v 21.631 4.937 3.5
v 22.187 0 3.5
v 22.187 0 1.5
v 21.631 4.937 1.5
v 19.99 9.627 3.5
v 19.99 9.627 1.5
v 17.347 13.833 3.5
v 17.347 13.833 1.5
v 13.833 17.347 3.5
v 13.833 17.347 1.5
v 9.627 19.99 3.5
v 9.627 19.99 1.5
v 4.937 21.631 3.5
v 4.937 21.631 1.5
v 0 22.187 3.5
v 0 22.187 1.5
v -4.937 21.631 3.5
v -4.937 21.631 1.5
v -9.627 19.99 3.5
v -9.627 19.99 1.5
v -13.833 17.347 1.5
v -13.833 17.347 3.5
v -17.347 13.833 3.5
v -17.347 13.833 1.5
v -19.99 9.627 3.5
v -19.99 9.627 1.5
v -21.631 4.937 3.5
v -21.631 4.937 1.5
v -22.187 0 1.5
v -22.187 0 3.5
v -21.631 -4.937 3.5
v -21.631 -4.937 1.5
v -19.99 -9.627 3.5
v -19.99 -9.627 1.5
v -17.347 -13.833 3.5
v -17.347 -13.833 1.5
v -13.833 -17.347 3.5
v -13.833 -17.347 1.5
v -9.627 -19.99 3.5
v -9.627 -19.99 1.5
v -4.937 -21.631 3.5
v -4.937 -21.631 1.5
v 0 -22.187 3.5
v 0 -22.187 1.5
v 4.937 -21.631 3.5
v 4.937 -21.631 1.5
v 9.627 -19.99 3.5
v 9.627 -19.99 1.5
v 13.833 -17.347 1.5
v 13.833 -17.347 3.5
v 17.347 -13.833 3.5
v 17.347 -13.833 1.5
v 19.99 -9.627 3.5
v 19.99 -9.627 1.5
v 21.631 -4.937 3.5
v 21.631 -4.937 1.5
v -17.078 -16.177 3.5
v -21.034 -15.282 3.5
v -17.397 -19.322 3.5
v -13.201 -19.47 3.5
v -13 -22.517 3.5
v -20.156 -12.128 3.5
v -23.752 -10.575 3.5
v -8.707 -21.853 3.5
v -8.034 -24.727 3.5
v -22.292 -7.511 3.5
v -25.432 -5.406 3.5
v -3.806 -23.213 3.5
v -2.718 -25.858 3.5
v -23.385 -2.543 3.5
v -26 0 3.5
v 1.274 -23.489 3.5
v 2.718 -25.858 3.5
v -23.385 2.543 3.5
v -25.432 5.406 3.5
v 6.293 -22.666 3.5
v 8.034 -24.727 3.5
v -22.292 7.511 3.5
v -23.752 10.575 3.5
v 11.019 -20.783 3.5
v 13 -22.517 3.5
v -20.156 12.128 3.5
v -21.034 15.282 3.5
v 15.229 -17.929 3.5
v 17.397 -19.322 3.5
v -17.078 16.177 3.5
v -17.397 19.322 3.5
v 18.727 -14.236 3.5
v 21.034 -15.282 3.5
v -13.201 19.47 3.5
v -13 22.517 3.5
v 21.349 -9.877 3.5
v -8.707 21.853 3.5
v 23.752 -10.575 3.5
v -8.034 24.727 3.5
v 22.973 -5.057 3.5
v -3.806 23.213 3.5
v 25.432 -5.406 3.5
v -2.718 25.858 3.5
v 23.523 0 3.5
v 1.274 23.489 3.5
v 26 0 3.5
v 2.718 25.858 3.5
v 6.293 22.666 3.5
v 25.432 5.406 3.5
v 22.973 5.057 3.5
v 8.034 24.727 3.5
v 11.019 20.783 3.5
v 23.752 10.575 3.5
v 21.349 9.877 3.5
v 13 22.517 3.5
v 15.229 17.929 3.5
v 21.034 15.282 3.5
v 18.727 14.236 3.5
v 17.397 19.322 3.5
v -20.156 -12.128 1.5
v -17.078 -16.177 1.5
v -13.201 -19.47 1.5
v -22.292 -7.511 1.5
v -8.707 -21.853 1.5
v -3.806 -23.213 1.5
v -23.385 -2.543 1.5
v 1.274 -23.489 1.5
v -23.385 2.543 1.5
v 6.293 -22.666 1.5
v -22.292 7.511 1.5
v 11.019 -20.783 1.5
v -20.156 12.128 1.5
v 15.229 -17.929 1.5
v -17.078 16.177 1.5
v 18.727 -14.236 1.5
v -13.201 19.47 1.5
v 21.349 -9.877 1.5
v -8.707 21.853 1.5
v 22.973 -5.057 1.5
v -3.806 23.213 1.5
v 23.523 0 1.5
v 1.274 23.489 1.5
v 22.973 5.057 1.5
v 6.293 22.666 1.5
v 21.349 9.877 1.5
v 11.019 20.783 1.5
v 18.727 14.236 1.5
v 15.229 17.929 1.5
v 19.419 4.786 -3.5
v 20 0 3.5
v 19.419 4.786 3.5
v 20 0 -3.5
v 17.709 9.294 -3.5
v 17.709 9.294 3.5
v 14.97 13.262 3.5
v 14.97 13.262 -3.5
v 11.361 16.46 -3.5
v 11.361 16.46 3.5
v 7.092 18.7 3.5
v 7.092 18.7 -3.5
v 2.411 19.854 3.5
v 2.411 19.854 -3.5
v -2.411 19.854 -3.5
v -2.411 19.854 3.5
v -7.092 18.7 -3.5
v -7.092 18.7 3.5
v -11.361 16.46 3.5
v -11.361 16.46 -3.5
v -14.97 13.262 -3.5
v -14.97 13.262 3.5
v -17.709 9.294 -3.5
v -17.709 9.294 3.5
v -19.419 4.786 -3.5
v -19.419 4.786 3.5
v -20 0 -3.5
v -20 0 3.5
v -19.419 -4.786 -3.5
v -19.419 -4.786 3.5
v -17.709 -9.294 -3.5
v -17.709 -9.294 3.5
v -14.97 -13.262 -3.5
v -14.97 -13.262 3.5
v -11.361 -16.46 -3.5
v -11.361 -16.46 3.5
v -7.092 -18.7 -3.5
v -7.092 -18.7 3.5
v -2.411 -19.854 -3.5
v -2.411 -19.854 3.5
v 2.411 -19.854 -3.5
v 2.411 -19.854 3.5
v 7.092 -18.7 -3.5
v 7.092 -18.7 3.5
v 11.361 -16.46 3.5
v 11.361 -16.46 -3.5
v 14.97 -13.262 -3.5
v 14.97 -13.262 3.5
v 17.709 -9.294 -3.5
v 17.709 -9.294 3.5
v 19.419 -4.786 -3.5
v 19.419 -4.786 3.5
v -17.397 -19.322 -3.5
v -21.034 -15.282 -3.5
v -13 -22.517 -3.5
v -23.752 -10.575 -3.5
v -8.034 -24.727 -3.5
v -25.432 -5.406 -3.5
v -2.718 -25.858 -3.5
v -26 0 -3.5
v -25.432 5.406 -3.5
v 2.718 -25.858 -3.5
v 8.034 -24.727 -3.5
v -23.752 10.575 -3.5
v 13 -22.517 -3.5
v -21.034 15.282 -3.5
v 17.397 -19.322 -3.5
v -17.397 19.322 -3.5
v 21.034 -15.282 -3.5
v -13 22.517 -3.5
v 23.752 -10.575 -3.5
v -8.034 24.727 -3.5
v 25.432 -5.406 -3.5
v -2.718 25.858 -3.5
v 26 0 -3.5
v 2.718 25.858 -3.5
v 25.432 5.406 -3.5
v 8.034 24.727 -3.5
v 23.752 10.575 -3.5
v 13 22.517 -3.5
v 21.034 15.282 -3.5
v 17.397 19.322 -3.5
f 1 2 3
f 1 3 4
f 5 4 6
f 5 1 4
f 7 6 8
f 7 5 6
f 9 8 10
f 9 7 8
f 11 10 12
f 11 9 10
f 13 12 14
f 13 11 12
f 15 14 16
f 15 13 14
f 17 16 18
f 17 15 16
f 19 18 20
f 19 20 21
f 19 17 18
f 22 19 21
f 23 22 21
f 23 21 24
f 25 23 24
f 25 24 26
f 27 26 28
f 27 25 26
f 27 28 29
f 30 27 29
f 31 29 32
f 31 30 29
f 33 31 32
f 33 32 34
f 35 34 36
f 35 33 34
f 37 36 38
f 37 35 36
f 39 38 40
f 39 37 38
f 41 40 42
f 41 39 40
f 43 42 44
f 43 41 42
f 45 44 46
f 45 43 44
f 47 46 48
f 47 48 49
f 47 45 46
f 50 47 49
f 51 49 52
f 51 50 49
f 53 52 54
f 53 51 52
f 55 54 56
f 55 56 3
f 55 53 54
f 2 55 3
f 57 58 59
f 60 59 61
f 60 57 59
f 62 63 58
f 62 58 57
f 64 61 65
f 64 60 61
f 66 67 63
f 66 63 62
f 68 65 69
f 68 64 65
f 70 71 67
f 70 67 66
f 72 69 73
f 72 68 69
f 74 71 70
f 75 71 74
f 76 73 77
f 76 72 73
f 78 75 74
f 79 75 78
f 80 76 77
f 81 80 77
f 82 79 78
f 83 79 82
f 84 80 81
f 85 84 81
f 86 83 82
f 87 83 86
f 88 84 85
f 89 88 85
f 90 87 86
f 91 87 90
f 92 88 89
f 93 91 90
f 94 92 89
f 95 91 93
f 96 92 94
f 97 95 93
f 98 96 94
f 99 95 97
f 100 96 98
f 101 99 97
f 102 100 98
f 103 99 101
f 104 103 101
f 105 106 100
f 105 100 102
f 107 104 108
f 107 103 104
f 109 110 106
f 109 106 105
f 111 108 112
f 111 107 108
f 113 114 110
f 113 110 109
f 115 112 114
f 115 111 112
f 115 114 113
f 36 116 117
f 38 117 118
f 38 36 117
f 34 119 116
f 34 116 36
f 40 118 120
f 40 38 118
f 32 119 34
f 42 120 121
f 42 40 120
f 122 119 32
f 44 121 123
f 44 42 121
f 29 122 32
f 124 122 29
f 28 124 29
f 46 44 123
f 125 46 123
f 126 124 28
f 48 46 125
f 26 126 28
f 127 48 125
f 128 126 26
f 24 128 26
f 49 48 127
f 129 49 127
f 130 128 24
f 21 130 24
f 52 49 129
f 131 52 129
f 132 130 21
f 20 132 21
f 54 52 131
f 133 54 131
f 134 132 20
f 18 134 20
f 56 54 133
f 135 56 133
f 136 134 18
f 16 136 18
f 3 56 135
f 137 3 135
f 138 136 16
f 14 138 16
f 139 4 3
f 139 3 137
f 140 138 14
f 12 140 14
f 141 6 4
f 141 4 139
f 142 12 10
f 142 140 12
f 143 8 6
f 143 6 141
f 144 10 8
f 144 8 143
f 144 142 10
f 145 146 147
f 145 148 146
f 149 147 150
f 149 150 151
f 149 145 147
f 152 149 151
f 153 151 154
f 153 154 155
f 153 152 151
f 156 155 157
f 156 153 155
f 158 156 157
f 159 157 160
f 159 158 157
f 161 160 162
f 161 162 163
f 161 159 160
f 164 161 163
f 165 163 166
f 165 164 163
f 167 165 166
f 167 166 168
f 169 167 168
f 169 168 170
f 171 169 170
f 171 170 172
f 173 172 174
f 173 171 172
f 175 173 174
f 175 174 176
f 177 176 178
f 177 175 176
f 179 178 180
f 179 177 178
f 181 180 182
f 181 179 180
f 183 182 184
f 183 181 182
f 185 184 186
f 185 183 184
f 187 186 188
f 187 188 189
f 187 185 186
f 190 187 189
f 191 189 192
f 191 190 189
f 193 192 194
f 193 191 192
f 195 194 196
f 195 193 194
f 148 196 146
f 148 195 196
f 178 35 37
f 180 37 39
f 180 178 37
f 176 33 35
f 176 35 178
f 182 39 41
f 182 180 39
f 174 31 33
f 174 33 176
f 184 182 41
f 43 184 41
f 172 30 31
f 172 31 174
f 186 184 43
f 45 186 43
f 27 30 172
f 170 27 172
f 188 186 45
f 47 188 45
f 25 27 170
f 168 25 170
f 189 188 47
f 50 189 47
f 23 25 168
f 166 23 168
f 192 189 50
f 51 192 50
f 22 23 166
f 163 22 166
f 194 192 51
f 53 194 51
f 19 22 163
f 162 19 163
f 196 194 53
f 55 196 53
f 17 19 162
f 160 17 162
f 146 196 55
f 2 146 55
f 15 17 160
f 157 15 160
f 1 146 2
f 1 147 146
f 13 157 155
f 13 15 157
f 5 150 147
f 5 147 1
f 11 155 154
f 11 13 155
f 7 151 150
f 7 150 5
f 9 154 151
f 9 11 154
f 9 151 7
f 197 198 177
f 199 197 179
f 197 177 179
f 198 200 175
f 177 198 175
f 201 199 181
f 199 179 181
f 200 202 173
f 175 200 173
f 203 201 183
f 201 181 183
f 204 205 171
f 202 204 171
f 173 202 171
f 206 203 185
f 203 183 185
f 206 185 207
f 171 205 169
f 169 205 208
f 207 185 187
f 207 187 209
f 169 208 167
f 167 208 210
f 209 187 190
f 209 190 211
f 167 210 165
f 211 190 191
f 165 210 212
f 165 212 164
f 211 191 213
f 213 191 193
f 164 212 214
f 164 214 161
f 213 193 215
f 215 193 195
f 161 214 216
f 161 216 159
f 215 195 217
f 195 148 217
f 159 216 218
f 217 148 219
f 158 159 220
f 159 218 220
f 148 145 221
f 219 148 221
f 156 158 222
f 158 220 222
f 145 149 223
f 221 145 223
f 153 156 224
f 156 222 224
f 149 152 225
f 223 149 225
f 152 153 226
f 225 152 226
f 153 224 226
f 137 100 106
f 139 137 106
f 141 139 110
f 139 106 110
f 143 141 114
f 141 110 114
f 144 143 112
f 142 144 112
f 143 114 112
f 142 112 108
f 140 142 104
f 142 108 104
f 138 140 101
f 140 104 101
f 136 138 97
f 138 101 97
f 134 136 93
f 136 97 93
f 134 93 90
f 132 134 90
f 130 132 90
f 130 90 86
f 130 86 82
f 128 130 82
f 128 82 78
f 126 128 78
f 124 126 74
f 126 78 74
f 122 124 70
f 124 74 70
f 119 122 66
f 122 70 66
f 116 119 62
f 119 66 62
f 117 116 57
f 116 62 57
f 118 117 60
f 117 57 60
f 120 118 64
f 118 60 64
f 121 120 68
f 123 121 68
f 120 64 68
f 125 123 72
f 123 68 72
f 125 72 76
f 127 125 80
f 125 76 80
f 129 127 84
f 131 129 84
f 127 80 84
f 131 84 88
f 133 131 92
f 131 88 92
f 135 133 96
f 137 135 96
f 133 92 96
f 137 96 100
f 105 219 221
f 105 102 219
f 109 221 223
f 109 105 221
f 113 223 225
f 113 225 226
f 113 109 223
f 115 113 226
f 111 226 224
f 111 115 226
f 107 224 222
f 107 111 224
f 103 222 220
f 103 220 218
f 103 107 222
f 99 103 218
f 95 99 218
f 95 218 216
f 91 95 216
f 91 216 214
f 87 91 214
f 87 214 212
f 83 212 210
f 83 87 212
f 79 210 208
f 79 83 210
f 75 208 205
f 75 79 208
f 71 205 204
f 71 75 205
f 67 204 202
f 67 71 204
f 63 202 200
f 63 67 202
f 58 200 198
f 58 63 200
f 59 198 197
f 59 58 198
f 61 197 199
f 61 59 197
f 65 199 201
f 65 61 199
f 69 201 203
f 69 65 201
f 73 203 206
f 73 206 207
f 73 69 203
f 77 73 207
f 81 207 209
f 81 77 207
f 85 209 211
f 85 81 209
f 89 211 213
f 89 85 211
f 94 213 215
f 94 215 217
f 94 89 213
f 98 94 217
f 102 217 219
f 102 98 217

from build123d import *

# Parameters (mm, degrees)
SKETCH_1_R          = 26
SKETCH_1_R_2        = 20
EXTRUDE_1_DEPTH     = 3.5
SKETCH_2_R          = 23.523275985
SKETCH_2_R_2        = 22.187065931
CUT_EXTRUDE_3_DEPTH = 2


with BuildPart() as part:
    # 草图1 → 凸台-拉伸1 (new, symmetric)
    with BuildSketch(Plane.XY):
        Circle(SKETCH_1_R)
        Circle(SKETCH_1_R_2, mode=Mode.SUBTRACT)
    extrude(amount=EXTRUDE_1_DEPTH, both=True)

    # 草图2 → 切除-拉伸3 (cut)
    with BuildSketch(Plane.XY.offset(3.5)):
        Circle(SKETCH_2_R)
        Circle(SKETCH_2_R_2, mode=Mode.SUBTRACT)
    extrude(amount=-CUT_EXTRUDE_3_DEPTH, mode=Mode.SUBTRACT)


solid = part.part
